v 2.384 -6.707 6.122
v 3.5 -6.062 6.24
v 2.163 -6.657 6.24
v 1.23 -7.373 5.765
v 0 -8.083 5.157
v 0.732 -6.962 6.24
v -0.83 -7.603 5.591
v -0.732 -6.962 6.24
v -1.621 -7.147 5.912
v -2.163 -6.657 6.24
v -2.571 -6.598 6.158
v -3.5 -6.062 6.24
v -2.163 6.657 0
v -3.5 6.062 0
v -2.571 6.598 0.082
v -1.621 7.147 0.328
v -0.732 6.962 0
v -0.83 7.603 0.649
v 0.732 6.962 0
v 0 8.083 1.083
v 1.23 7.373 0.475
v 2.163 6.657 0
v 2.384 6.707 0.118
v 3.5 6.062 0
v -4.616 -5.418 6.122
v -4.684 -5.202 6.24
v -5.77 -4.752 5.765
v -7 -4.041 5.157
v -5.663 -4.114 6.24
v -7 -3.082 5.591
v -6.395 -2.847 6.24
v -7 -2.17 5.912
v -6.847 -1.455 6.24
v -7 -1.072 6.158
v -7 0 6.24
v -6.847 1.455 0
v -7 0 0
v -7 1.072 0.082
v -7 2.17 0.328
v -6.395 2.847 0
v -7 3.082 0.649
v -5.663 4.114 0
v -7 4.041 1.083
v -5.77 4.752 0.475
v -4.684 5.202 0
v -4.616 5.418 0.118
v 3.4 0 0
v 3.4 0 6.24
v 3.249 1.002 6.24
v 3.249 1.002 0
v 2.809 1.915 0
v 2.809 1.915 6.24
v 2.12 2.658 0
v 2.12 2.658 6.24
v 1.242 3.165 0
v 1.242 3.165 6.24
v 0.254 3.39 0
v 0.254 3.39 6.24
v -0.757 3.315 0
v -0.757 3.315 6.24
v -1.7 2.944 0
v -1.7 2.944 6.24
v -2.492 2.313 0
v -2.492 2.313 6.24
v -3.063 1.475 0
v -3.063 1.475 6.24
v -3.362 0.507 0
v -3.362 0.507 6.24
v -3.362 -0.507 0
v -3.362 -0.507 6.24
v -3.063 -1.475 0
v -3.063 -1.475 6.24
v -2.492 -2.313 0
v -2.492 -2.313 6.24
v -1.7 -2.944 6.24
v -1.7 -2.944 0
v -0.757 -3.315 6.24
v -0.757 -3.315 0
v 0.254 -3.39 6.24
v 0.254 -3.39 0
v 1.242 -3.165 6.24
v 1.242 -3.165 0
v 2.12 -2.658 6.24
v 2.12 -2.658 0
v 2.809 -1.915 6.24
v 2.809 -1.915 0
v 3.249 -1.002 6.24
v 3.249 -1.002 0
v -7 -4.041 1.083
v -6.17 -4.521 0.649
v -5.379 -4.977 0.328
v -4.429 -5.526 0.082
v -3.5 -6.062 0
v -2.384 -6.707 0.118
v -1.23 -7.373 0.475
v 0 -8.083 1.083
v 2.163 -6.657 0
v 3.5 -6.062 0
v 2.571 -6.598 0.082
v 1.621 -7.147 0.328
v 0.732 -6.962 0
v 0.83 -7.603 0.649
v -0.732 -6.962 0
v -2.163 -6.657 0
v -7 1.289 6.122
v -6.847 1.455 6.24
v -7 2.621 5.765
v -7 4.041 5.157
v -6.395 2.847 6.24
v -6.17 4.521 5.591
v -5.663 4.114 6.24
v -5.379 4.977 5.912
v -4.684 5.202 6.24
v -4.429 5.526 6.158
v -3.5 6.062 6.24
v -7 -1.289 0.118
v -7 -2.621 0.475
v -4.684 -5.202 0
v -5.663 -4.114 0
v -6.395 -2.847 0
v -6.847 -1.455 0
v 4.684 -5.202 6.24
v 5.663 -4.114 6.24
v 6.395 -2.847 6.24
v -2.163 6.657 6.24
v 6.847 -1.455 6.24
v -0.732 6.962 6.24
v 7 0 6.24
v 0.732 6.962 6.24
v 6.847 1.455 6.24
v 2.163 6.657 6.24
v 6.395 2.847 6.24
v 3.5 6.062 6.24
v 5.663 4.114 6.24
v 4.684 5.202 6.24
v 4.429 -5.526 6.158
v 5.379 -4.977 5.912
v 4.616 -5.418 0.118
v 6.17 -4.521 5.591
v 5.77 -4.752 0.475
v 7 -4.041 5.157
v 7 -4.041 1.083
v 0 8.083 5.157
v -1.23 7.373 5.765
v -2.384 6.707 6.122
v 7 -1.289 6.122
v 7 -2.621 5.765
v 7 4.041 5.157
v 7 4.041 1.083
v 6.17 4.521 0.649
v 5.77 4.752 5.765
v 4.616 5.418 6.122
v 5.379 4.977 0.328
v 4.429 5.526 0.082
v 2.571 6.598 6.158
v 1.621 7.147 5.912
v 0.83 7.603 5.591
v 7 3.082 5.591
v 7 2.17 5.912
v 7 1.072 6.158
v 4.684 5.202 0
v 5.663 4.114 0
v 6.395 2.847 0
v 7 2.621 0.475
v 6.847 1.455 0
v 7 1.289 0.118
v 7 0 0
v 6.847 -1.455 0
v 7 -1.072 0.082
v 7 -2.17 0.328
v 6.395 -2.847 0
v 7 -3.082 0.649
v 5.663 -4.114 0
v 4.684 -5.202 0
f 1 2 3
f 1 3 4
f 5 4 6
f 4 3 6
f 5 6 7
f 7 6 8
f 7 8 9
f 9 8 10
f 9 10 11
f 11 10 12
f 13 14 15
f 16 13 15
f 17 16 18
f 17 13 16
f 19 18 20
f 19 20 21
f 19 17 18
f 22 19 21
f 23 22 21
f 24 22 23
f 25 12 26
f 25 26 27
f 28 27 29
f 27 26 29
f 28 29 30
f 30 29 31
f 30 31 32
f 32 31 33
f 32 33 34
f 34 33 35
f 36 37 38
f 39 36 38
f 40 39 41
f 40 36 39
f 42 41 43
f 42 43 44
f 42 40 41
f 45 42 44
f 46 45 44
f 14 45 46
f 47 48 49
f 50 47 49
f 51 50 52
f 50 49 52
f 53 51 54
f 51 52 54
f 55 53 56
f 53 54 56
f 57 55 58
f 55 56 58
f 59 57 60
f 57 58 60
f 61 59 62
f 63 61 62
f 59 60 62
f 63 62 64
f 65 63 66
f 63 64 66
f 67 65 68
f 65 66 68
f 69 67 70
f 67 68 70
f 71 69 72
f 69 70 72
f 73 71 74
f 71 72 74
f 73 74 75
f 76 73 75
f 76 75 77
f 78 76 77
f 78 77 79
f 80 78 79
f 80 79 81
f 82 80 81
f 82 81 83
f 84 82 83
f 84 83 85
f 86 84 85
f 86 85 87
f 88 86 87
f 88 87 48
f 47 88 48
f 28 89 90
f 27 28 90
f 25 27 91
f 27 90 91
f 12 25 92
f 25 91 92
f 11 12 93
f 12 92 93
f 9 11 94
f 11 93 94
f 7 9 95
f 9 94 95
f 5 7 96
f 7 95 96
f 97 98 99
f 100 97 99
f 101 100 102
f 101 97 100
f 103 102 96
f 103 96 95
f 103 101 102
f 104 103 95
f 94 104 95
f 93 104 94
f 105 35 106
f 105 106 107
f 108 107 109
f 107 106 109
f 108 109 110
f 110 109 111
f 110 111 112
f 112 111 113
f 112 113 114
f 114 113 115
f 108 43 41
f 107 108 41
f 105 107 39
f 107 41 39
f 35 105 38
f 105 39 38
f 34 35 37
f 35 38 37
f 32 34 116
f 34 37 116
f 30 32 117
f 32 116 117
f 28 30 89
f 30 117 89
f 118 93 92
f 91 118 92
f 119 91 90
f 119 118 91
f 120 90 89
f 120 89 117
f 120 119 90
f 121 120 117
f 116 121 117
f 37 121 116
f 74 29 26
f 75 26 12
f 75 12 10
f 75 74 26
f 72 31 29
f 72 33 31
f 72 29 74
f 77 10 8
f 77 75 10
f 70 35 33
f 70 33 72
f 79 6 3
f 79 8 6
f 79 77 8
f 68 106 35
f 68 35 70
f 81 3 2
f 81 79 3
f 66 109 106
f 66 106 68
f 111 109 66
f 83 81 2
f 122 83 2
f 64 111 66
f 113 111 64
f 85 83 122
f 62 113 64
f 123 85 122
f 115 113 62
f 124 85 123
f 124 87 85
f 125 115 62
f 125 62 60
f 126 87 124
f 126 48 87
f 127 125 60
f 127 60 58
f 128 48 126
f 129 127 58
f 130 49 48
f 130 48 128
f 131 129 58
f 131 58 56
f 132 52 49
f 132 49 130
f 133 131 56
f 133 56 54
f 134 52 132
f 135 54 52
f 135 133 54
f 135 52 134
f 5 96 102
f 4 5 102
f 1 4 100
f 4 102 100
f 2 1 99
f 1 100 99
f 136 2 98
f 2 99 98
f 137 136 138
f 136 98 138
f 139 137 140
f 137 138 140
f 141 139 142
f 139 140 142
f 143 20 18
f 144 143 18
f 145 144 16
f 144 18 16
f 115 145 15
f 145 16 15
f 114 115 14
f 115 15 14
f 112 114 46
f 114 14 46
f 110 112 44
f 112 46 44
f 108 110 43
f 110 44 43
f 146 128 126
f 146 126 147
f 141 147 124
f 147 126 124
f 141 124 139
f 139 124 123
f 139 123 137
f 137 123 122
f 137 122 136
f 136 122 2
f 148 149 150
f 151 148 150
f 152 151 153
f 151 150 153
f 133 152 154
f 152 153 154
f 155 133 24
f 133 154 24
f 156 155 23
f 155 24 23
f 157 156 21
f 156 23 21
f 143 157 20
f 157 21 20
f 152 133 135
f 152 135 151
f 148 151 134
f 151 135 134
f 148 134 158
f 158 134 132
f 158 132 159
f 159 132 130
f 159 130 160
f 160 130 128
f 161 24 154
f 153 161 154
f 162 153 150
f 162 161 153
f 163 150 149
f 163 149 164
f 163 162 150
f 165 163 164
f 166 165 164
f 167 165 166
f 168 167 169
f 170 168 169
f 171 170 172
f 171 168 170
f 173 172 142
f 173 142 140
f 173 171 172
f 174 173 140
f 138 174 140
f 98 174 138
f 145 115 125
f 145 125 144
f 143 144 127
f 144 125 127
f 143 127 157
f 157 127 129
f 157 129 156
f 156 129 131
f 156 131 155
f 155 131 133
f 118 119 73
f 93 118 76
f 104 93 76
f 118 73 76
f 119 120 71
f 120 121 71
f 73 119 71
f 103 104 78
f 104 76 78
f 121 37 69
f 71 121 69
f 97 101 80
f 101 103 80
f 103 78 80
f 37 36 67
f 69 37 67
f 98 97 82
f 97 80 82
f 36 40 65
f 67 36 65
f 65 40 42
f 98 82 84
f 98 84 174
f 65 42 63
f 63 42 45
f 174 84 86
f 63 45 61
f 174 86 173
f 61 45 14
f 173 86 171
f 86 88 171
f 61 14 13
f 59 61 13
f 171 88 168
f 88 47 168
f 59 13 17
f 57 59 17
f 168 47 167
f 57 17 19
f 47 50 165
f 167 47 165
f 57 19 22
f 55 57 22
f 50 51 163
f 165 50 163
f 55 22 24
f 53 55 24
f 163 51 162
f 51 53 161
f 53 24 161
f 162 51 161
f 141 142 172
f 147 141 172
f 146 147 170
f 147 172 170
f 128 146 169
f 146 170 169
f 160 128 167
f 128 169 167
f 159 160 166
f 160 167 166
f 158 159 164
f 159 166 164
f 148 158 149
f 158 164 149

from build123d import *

# Parameters (mm, degrees)
EXTRUDE_6_DEPTH        = 6.24
HOLE_WIZARD_M8_2_D     = 6.8
HOLE_WIZARD_M8_2_DEPTH = 6.24


with BuildPart() as part:
    # 草圖12 → 填料-伸長6 (new body)
    with BuildSketch(Plane.XY):
        Polygon((7, -4.041451884), (7, 4.041451884), (0, 8.082903769), (-7, 4.041451884), (-7, -4.041451884), (0, -8.082903769), align=None)
    extrude(amount=EXTRUDE_6_DEPTH)

    # M8 螺紋孔2
    with Locations(Plane(origin=(0, 0, 0), x_dir=(-1, 0, 0), z_dir=(0, 0, -1))):
        with Locations((0, 0)):
            Hole(HOLE_WIZARD_M8_2_D / 2, depth=HOLE_WIZARD_M8_2_DEPTH)

    # 草圖17 → 除料-旋轉1 (revolve, cut)
    with BuildSketch(Plane(origin=(0, 0, 0), x_dir=(0, 0, -1), z_dir=(1, 0, 0))):
        Polygon((0, 8.082903769), (-1.082903769, 8.082903769), (0, 7), align=None)
        Polygon((-6.24, 7), (-6.24, 8.082903769), (-5.157096231, 8.082903769), align=None)
    revolve(axis=Axis((0, 0, 0), (0, 0, -1)), mode=Mode.SUBTRACT)


solid = part.part
